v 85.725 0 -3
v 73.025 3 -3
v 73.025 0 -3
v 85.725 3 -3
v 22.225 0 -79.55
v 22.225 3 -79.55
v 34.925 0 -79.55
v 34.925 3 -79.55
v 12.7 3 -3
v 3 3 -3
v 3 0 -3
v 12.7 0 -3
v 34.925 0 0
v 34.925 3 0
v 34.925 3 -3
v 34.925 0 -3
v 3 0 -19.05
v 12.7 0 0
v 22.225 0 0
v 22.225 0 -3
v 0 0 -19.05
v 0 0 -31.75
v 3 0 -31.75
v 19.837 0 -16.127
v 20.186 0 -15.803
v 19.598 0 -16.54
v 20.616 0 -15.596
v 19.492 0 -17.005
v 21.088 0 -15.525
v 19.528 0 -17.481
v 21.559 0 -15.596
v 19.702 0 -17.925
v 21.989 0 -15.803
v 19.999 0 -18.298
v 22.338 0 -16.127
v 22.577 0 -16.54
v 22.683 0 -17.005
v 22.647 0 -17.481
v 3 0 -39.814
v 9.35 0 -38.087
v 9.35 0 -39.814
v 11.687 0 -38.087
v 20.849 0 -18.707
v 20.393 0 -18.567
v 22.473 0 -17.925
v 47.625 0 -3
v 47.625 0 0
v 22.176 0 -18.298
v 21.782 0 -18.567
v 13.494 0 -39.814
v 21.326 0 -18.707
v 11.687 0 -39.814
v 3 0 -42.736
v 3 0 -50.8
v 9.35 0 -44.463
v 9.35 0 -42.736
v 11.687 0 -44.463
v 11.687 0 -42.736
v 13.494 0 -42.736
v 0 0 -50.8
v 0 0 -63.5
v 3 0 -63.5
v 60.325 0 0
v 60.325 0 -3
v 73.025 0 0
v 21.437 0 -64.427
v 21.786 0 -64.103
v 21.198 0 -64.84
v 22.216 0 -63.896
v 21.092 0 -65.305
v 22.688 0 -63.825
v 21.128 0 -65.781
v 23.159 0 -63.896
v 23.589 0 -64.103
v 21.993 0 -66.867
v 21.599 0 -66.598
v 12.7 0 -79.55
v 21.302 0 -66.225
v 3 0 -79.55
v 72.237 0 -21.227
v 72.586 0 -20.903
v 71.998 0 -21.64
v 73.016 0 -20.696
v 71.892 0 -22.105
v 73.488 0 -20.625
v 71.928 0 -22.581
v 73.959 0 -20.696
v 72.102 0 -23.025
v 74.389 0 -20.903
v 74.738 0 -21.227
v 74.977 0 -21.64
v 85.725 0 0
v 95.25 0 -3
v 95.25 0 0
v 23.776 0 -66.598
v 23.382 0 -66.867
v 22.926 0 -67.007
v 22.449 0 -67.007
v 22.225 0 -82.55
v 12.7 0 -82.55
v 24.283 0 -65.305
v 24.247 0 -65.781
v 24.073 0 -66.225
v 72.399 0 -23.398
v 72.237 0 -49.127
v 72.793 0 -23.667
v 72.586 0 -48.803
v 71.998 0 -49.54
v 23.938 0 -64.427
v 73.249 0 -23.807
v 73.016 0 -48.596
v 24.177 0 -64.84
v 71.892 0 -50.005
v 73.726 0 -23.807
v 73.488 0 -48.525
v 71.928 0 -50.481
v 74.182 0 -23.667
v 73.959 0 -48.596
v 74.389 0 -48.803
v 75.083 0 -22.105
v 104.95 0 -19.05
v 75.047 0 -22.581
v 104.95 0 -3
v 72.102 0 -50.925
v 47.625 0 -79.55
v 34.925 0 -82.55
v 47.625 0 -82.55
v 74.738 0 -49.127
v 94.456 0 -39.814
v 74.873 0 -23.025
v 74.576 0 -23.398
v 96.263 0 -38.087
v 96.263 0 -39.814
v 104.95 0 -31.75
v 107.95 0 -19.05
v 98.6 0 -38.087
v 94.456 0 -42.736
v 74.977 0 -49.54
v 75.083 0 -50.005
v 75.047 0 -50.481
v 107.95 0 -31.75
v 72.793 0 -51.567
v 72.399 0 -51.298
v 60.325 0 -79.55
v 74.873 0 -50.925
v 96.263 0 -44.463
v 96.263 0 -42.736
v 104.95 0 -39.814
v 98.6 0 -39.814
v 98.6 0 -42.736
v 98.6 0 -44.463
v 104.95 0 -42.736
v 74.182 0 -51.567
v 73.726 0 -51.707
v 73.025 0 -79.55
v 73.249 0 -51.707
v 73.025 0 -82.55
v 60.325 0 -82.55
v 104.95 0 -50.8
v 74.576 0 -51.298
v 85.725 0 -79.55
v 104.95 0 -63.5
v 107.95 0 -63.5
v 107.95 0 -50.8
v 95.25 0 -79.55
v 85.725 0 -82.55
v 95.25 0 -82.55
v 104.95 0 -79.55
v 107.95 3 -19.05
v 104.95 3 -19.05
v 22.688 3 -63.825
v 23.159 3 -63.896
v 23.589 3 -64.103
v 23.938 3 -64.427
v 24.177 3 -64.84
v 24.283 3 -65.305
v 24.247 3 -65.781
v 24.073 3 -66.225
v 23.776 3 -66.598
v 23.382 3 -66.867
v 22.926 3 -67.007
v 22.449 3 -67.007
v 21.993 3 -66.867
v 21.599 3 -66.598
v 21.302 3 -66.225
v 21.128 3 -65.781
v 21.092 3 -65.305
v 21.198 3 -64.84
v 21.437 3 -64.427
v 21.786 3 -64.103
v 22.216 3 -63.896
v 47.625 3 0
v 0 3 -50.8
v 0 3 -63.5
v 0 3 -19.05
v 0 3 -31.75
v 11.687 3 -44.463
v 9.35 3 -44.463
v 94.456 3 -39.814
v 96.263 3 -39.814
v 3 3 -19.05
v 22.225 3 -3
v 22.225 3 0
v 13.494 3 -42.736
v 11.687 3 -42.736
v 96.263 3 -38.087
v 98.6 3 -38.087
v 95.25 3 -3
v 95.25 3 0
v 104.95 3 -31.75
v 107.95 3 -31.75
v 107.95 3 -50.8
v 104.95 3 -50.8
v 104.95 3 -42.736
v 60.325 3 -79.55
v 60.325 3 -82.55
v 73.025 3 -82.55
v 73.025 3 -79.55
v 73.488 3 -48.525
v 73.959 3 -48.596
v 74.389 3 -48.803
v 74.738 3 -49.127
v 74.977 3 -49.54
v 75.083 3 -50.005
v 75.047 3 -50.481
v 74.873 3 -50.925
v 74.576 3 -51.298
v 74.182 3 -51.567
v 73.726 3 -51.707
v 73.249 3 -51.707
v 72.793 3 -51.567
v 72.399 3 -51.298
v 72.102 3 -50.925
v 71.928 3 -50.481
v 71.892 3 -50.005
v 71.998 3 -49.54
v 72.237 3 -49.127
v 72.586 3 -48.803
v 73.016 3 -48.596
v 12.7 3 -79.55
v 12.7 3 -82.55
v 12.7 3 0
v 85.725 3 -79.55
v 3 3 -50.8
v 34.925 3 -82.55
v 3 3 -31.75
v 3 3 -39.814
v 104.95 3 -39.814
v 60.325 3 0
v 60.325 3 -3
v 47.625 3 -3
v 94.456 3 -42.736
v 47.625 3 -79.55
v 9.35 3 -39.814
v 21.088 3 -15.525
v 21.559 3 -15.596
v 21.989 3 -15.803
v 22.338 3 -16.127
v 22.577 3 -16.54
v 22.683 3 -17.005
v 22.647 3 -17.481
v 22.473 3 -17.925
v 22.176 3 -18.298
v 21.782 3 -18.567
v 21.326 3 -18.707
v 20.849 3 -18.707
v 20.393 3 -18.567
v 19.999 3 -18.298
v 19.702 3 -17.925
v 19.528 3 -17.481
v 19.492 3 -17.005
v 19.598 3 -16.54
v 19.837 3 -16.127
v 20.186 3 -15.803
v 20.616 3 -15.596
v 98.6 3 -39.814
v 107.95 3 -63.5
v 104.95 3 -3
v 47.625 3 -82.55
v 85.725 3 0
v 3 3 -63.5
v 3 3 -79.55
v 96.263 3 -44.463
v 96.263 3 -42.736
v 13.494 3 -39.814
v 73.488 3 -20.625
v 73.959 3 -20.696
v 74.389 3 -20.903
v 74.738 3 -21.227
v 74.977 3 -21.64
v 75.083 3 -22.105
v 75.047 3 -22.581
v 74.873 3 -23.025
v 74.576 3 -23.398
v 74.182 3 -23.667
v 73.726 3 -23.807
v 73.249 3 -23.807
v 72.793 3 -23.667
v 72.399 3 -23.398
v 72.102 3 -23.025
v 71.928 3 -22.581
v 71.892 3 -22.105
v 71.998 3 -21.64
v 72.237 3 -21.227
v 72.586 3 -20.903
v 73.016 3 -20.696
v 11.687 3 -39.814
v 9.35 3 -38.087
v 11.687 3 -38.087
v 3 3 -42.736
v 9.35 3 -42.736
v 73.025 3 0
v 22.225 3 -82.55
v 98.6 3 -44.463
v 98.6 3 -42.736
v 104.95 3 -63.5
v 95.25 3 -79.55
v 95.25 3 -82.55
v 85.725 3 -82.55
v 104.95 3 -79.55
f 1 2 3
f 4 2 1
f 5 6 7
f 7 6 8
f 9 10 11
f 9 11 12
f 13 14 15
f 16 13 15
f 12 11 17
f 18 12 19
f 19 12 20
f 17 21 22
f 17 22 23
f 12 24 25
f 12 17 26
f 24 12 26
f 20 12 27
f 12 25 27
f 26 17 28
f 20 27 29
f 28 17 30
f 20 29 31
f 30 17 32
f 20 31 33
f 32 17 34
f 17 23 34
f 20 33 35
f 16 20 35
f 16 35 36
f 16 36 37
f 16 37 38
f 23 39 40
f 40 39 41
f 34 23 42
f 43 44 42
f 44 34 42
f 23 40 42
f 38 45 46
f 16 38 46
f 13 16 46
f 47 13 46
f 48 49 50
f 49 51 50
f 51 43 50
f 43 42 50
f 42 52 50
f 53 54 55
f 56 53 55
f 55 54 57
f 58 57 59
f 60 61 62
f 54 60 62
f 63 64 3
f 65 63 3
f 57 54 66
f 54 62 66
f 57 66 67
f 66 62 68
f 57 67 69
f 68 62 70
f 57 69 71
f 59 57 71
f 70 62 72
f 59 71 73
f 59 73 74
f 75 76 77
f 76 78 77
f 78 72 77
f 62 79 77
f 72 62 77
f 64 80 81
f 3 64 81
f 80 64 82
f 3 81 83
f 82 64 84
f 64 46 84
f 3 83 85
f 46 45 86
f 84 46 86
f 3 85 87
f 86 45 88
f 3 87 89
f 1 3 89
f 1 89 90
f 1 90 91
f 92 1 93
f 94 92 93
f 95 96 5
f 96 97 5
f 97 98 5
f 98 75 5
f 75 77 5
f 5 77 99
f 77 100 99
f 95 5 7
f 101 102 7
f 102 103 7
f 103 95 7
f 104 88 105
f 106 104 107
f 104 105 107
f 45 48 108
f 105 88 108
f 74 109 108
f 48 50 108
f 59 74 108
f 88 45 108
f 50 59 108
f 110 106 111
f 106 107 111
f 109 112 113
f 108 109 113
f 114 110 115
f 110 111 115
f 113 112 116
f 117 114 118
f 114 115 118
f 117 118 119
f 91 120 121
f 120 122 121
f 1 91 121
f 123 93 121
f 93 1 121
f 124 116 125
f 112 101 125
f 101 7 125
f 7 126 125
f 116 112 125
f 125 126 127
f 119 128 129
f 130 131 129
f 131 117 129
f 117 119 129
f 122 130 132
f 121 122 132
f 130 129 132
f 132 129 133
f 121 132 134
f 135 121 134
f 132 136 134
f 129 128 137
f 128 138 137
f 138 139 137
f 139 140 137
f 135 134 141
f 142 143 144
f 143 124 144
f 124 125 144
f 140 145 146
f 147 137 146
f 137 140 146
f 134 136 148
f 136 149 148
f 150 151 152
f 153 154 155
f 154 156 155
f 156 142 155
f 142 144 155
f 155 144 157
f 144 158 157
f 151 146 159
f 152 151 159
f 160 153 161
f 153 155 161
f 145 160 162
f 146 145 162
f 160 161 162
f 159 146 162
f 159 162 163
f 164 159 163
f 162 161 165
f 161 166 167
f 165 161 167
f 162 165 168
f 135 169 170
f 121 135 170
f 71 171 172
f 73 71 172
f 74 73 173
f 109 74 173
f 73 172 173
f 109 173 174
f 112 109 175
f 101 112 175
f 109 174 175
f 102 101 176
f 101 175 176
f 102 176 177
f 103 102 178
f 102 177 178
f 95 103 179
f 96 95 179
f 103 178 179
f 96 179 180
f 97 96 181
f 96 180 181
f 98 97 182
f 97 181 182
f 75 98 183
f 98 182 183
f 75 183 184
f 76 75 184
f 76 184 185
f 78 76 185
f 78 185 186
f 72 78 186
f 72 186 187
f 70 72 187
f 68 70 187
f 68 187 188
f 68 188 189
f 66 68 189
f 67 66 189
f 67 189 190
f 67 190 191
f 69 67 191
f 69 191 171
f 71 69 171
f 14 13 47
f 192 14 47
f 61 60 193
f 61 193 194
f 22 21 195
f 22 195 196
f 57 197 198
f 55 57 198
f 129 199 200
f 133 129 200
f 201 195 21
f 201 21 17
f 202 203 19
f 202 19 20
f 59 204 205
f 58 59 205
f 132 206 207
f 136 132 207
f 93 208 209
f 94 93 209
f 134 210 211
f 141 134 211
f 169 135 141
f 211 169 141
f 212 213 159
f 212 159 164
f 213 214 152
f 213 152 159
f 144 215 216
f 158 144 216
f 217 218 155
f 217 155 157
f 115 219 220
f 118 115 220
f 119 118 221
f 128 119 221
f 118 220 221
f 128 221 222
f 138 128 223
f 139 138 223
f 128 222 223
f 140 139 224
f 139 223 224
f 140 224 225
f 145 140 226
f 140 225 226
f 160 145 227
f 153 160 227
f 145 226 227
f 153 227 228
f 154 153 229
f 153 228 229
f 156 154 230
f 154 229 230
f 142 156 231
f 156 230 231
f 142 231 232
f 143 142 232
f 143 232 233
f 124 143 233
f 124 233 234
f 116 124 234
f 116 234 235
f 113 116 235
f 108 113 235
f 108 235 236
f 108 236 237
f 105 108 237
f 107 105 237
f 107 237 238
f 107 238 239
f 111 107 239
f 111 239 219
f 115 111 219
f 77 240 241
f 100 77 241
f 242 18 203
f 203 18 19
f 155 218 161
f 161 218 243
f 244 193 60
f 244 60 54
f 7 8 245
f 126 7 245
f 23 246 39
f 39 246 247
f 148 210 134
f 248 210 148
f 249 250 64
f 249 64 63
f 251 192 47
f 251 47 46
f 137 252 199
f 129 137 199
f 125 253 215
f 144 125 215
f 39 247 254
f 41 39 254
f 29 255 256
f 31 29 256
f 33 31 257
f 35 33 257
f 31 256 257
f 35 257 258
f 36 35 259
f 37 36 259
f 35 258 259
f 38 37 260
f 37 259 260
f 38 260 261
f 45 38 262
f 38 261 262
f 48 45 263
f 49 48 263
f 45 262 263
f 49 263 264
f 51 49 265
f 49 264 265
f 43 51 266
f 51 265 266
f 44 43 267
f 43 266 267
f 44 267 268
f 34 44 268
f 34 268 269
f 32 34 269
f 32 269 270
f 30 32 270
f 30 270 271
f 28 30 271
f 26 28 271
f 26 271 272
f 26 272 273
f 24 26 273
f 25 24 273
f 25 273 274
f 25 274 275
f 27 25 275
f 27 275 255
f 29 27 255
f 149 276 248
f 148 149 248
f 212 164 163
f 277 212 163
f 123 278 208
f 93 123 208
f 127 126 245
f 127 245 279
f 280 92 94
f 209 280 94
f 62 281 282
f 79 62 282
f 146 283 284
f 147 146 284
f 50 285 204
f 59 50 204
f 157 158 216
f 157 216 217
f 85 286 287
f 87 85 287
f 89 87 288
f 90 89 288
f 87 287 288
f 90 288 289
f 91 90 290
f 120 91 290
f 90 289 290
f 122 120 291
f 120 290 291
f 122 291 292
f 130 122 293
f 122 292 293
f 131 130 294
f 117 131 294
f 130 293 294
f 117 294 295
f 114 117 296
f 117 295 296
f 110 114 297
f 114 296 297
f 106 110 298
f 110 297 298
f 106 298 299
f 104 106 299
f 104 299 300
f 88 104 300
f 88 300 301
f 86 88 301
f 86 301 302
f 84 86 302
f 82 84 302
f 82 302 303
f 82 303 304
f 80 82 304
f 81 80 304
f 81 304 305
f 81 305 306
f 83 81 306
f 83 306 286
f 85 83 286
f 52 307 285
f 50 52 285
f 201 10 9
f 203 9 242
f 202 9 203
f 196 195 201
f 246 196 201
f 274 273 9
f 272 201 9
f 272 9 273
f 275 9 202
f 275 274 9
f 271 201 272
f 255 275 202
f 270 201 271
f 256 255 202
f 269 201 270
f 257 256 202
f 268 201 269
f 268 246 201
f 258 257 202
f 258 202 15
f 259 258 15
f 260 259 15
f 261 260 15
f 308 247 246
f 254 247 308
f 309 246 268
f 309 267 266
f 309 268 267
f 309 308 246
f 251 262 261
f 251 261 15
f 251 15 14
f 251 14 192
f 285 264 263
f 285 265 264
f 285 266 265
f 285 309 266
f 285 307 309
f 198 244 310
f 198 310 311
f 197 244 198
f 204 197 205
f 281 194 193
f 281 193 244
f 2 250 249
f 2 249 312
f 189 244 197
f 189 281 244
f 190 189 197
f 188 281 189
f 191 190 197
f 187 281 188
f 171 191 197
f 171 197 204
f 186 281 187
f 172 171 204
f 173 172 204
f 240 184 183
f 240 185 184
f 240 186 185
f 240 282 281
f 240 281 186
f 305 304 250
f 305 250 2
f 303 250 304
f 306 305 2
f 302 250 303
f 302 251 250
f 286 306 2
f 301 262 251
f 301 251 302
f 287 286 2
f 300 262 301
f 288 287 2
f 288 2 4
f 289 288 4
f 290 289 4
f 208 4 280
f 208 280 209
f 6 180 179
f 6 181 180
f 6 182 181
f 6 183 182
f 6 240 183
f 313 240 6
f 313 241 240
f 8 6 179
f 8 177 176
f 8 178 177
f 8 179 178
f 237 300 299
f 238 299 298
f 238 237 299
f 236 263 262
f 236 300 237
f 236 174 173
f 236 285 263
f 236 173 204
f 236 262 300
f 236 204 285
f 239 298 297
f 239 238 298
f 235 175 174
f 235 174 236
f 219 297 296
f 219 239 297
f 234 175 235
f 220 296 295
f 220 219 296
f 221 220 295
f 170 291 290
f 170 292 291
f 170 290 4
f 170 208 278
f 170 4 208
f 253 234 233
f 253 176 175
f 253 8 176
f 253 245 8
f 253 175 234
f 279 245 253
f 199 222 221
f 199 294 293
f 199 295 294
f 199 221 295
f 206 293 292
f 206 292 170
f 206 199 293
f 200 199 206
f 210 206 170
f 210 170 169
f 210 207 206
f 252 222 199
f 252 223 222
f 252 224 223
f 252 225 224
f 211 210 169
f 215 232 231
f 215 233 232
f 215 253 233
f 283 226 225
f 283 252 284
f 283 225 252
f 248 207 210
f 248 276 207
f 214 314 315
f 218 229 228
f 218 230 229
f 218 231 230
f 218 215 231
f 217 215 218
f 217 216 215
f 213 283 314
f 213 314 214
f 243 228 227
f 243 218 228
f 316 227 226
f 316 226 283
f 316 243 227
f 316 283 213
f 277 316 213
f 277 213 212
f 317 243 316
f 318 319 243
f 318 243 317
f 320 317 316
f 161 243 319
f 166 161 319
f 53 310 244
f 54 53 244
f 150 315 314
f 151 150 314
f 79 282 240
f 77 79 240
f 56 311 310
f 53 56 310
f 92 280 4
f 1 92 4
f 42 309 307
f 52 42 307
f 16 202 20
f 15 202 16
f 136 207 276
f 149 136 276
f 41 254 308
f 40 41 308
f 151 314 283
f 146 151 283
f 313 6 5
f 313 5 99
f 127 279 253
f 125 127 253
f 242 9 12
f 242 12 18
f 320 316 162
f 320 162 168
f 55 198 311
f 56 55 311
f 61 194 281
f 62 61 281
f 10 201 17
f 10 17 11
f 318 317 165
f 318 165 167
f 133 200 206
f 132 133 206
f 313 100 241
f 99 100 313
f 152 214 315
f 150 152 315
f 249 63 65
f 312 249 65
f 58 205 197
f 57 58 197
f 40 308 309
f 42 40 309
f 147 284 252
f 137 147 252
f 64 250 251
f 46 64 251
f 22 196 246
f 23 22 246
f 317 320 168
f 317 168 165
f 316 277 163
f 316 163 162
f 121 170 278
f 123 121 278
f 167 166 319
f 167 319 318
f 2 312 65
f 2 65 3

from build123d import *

# Parameters (mm, degrees)
SKETCH1_W           = 107.95
SKETCH1_H           = 82.55
BOSS_EXTRUDE1_DEPTH = 3
CUT_EXTRUDE2_REACH  = 137.929
SKETCH3_W           = 12.7
SKETCH3_H           = 3
SKETCH3_W_2         = 3
SKETCH3_H_2         = 19.05
CUT_EXTRUDE3_REACH  = 137.929
SKETCH4_R           = 1.6
CUT_EXTRUDE5_REACH  = 137.929


with BuildPart() as part:
    # Sketch1 → Boss-Extrude1 (new body)
    with BuildSketch(Plane(origin=(0, 0, 0), x_dir=(1, 0, 0), z_dir=(0, 1, 0))):
        with Locations((53.975, 41.275)):
            Rectangle(SKETCH1_W, SKETCH1_H)
    extrude(amount=BOSS_EXTRUDE1_DEPTH)

    # Sketch3 → Cut-Extrude2 (cut, up to next)
    with BuildSketch(Plane(origin=(0, 3, 0), x_dir=(1, 0, 0), z_dir=(0, 1, 0)), mode=Mode.PRIVATE) as cut_extrude2_sk1:
        with Locations((28.575, 1.5)):
            Rectangle(SKETCH3_W, SKETCH3_H)
    cut_extrude2_tool1 = extrude(cut_extrude2_sk1.sketch, amount=-CUT_EXTRUDE2_REACH, mode=Mode.PRIVATE) & part.part
    # Sketch3 → Cut-Extrude2 (cut, up to next)
    with BuildSketch(Plane(origin=(0, 3, 0), x_dir=(1, 0, 0), z_dir=(0, 1, 0)), mode=Mode.PRIVATE) as cut_extrude2_sk2:
        with Locations((79.375, 1.5)):
            Rectangle(SKETCH3_W, SKETCH3_H)
    cut_extrude2_tool2 = extrude(cut_extrude2_sk2.sketch, amount=-CUT_EXTRUDE2_REACH, mode=Mode.PRIVATE) & part.part
    # Sketch3 → Cut-Extrude2 (cut, up to next)
    with BuildSketch(Plane(origin=(0, 3, 0), x_dir=(1, 0, 0), z_dir=(0, 1, 0)), mode=Mode.PRIVATE) as cut_extrude2_sk3:
        with Locations((79.375, 81.05)):
            Rectangle(SKETCH3_W, SKETCH3_H)
    cut_extrude2_tool3 = extrude(cut_extrude2_sk3.sketch, amount=-CUT_EXTRUDE2_REACH, mode=Mode.PRIVATE) & part.part
    # Sketch3 → Cut-Extrude2 (cut, up to next)
    with BuildSketch(Plane(origin=(0, 3, 0), x_dir=(1, 0, 0), z_dir=(0, 1, 0)), mode=Mode.PRIVATE) as cut_extrude2_sk4:
        with Locations((1.5, 41.275)):
            Rectangle(SKETCH3_W_2, SKETCH3_H_2)
    cut_extrude2_tool4 = extrude(cut_extrude2_sk4.sketch, amount=-CUT_EXTRUDE2_REACH, mode=Mode.PRIVATE) & part.part
    # Sketch3 → Cut-Extrude2 (cut, up to next)
    with BuildSketch(Plane(origin=(0, 3, 0), x_dir=(1, 0, 0), z_dir=(0, 1, 0)), mode=Mode.PRIVATE) as cut_extrude2_sk5:
        with Locations((28.575, 81.05)):
            Rectangle(SKETCH3_W, SKETCH3_H)
    cut_extrude2_tool5 = extrude(cut_extrude2_sk5.sketch, amount=-CUT_EXTRUDE2_REACH, mode=Mode.PRIVATE) & part.part
    # Sketch3 → Cut-Extrude2 (cut, up to next)
    with BuildSketch(Plane(origin=(0, 3, 0), x_dir=(1, 0, 0), z_dir=(0, 1, 0)), mode=Mode.PRIVATE) as cut_extrude2_sk6:
        Polygon((53.975, 3), (60.325, 3), (60.325, 0), (53.975, 0), (47.625, 0), (47.625, 3), align=None)
    cut_extrude2_tool6 = extrude(cut_extrude2_sk6.sketch, amount=-CUT_EXTRUDE2_REACH, mode=Mode.PRIVATE) & part.part
    # Sketch3 → Cut-Extrude2 (cut, up to next)
    with BuildSketch(Plane(origin=(0, 3, 0), x_dir=(1, 0, 0), z_dir=(0, 1, 0)), mode=Mode.PRIVATE) as cut_extrude2_sk7:
        Polygon((60.325, 82.55), (53.975, 82.55), (47.625, 82.55), (47.625, 79.55), (53.975, 79.55), (60.325, 79.55), align=None)
    cut_extrude2_tool7 = extrude(cut_extrude2_sk7.sketch, amount=-CUT_EXTRUDE2_REACH, mode=Mode.PRIVATE) & part.part
    # Sketch3 → Cut-Extrude2 (cut, up to next)
    with BuildSketch(Plane(origin=(0, 3, 0), x_dir=(1, 0, 0), z_dir=(0, 1, 0)), mode=Mode.PRIVATE) as cut_extrude2_sk8:
        Polygon((0, 19.05), (3, 19.05), (3, 3), (12.7, 3), (12.7, 0), (0, 0), (0, 3), align=None)
    cut_extrude2_tool8 = extrude(cut_extrude2_sk8.sketch, amount=-CUT_EXTRUDE2_REACH, mode=Mode.PRIVATE) & part.part
    # Sketch3 → Cut-Extrude2 (cut, up to next)
    with BuildSketch(Plane(origin=(0, 3, 0), x_dir=(1, 0, 0), z_dir=(0, 1, 0)), mode=Mode.PRIVATE) as cut_extrude2_sk9:
        Polygon((107.95, 0), (107.95, 3), (107.95, 19.05), (104.95, 19.05), (104.95, 3), (95.25, 3), (95.25, 0), align=None)
    cut_extrude2_tool9 = extrude(cut_extrude2_sk9.sketch, amount=-CUT_EXTRUDE2_REACH, mode=Mode.PRIVATE) & part.part
    # Sketch3 → Cut-Extrude2 (cut, up to next)
    with BuildSketch(Plane(origin=(0, 3, 0), x_dir=(1, 0, 0), z_dir=(0, 1, 0)), mode=Mode.PRIVATE) as cut_extrude2_sk10:
        Polygon((0, 79.55), (0, 63.5), (3, 63.5), (3, 79.55), (12.7, 79.55), (12.7, 82.55), (0, 82.55), align=None)
    cut_extrude2_tool10 = extrude(cut_extrude2_sk10.sketch, amount=-CUT_EXTRUDE2_REACH, mode=Mode.PRIVATE) & part.part
    # Sketch3 → Cut-Extrude2 (cut, up to next)
    with BuildSketch(Plane(origin=(0, 3, 0), x_dir=(1, 0, 0), z_dir=(0, 1, 0)), mode=Mode.PRIVATE) as cut_extrude2_sk11:
        with Locations((106.45, 41.275)):
            Rectangle(SKETCH3_W_2, SKETCH3_H_2)
    cut_extrude2_tool11 = extrude(cut_extrude2_sk11.sketch, amount=-CUT_EXTRUDE2_REACH, mode=Mode.PRIVATE) & part.part
    # Sketch3 → Cut-Extrude2 (cut, up to next)
    with BuildSketch(Plane(origin=(0, 3, 0), x_dir=(1, 0, 0), z_dir=(0, 1, 0)), mode=Mode.PRIVATE) as cut_extrude2_sk12:
        Polygon((107.95, 63.5), (104.95, 63.5), (104.95, 79.55), (95.25, 79.55), (95.25, 82.55), (107.95, 82.55), (107.95, 79.55), align=None)
    cut_extrude2_tool12 = extrude(cut_extrude2_sk12.sketch, amount=-CUT_EXTRUDE2_REACH, mode=Mode.PRIVATE) & part.part
    add(cut_extrude2_tool1.solids().sort_by_distance((28.575, 3, -1.5))[0], mode=Mode.SUBTRACT)
    add(cut_extrude2_tool2.solids().sort_by_distance((79.375, 3, -1.5))[0], mode=Mode.SUBTRACT)
    add(cut_extrude2_tool3.solids().sort_by_distance((79.375, 3, -81.05))[0], mode=Mode.SUBTRACT)
    add(cut_extrude2_tool4.solids().sort_by_distance((1.5, 3, -41.275))[0], mode=Mode.SUBTRACT)
    add(cut_extrude2_tool5.solids().sort_by_distance((28.575, 3, -81.05))[0], mode=Mode.SUBTRACT)
    add(cut_extrude2_tool6.solids().sort_by_distance((53.975, 3, -1.5))[0], mode=Mode.SUBTRACT)
    add(cut_extrude2_tool7.solids().sort_by_distance((53.975, 3, -81.05))[0], mode=Mode.SUBTRACT)
    add(cut_extrude2_tool8.solids().sort_by_distance((1.5, 3, -18.821047))[0], mode=Mode.SUBTRACT)
    add(cut_extrude2_tool9.solids().sort_by_distance((107.721047, 3, -1.5))[0], mode=Mode.SUBTRACT)
    add(cut_extrude2_tool10.solids().sort_by_distance((0.228953, 3, -71.525))[0], mode=Mode.SUBTRACT)
    add(cut_extrude2_tool11.solids().sort_by_distance((106.45, 3, -41.275))[0], mode=Mode.SUBTRACT)
    add(cut_extrude2_tool12.solids().sort_by_distance((106.45, 3, -63.728953))[0], mode=Mode.SUBTRACT)

    # Sketch4 → Cut-Extrude3 (cut, up to next)
    with BuildSketch(Plane(origin=(0, 3, 0), x_dir=(1, 0, 0), z_dir=(0, 1, 0)), mode=Mode.PRIVATE) as cut_extrude3_sk1:
        with Locations(Location((22.6875, 65.425, 0), (0, 0, 270))):
            Circle(SKETCH4_R)
    cut_extrude3_tool1 = extrude(cut_extrude3_sk1.sketch, amount=-CUT_EXTRUDE3_REACH, mode=Mode.PRIVATE) & part.part
    # Sketch4 → Cut-Extrude3 (cut, up to next)
    with BuildSketch(Plane(origin=(0, 3, 0), x_dir=(1, 0, 0), z_dir=(0, 1, 0)), mode=Mode.PRIVATE) as cut_extrude3_sk2:
        with Locations(Location((21.0875, 17.125, 0), (0, 0, 270))):
            Circle(SKETCH4_R)
    cut_extrude3_tool2 = extrude(cut_extrude3_sk2.sketch, amount=-CUT_EXTRUDE3_REACH, mode=Mode.PRIVATE) & part.part
    # Sketch4 → Cut-Extrude3 (cut, up to next)
    with BuildSketch(Plane(origin=(0, 3, 0), x_dir=(1, 0, 0), z_dir=(0, 1, 0)), mode=Mode.PRIVATE) as cut_extrude3_sk3:
        with Locations(Location((73.4875, 22.225, 0), (0, 0, 270))):
            Circle(SKETCH4_R)
    cut_extrude3_tool3 = extrude(cut_extrude3_sk3.sketch, amount=-CUT_EXTRUDE3_REACH, mode=Mode.PRIVATE) & part.part
    # Sketch4 → Cut-Extrude3 (cut, up to next)
    with BuildSketch(Plane(origin=(0, 3, 0), x_dir=(1, 0, 0), z_dir=(0, 1, 0)), mode=Mode.PRIVATE) as cut_extrude3_sk4:
        with Locations(Location((73.4875, 50.125, 0), (0, 0, 270))):
            Circle(SKETCH4_R)
    cut_extrude3_tool4 = extrude(cut_extrude3_sk4.sketch, amount=-CUT_EXTRUDE3_REACH, mode=Mode.PRIVATE) & part.part
    add(cut_extrude3_tool1.solids().sort_by_distance((22.6875, 3, -65.425))[0], mode=Mode.SUBTRACT)
    add(cut_extrude3_tool2.solids().sort_by_distance((21.0875, 3, -17.125))[0], mode=Mode.SUBTRACT)
    add(cut_extrude3_tool3.solids().sort_by_distance((73.4875, 3, -22.225))[0], mode=Mode.SUBTRACT)
    add(cut_extrude3_tool4.solids().sort_by_distance((73.4875, 3, -50.125))[0], mode=Mode.SUBTRACT)

    # Sketch6 → Cut-Extrude5 (cut, up to next)
    with BuildSketch(Plane(origin=(0, 3, 0), x_dir=(1, 0, 0), z_dir=(0, 1, 0)), mode=Mode.PRIVATE) as cut_extrude5_sk1:
        Polygon((3, 39.8145), (9.35, 39.8145), (9.35, 38.0873), (11.6868, 38.0873), (11.6868, 39.8145), (13.49375, 39.8145), (13.49375, 41.275), (13.49375, 42.7355), (11.6868, 42.7355), (11.6868, 44.4627), (9.35, 44.4627), (9.35, 42.7355), (3, 42.7355), (3, 41.275), align=None)
    cut_extrude5_tool1 = extrude(cut_extrude5_sk1.sketch, amount=-CUT_EXTRUDE5_REACH, mode=Mode.PRIVATE) & part.part
    # Sketch6 → Cut-Extrude5 (cut, up to next)
    with BuildSketch(Plane(origin=(0, 3, 0), x_dir=(1, 0, 0), z_dir=(0, 1, 0)), mode=Mode.PRIVATE) as cut_extrude5_sk2:
        Polygon((94.45625, 42.7355), (94.45625, 41.275), (94.45625, 39.8145), (96.2632, 39.8145), (96.2632, 38.0873), (98.6, 38.0873), (98.6, 39.8145), (104.95, 39.8145), (104.95, 41.275), (104.95, 42.7355), (98.6, 42.7355), (98.6, 44.4627), (96.2632, 44.4627), (96.2632, 42.7355), align=None)
    cut_extrude5_tool2 = extrude(cut_extrude5_sk2.sketch, amount=-CUT_EXTRUDE5_REACH, mode=Mode.PRIVATE) & part.part
    add(cut_extrude5_tool1.solids().sort_by_distance((8.720382, 3, -41.275))[0], mode=Mode.SUBTRACT)
    add(cut_extrude5_tool2.solids().sort_by_distance((99.229618, 3, -41.275))[0], mode=Mode.SUBTRACT)


solid = part.part
